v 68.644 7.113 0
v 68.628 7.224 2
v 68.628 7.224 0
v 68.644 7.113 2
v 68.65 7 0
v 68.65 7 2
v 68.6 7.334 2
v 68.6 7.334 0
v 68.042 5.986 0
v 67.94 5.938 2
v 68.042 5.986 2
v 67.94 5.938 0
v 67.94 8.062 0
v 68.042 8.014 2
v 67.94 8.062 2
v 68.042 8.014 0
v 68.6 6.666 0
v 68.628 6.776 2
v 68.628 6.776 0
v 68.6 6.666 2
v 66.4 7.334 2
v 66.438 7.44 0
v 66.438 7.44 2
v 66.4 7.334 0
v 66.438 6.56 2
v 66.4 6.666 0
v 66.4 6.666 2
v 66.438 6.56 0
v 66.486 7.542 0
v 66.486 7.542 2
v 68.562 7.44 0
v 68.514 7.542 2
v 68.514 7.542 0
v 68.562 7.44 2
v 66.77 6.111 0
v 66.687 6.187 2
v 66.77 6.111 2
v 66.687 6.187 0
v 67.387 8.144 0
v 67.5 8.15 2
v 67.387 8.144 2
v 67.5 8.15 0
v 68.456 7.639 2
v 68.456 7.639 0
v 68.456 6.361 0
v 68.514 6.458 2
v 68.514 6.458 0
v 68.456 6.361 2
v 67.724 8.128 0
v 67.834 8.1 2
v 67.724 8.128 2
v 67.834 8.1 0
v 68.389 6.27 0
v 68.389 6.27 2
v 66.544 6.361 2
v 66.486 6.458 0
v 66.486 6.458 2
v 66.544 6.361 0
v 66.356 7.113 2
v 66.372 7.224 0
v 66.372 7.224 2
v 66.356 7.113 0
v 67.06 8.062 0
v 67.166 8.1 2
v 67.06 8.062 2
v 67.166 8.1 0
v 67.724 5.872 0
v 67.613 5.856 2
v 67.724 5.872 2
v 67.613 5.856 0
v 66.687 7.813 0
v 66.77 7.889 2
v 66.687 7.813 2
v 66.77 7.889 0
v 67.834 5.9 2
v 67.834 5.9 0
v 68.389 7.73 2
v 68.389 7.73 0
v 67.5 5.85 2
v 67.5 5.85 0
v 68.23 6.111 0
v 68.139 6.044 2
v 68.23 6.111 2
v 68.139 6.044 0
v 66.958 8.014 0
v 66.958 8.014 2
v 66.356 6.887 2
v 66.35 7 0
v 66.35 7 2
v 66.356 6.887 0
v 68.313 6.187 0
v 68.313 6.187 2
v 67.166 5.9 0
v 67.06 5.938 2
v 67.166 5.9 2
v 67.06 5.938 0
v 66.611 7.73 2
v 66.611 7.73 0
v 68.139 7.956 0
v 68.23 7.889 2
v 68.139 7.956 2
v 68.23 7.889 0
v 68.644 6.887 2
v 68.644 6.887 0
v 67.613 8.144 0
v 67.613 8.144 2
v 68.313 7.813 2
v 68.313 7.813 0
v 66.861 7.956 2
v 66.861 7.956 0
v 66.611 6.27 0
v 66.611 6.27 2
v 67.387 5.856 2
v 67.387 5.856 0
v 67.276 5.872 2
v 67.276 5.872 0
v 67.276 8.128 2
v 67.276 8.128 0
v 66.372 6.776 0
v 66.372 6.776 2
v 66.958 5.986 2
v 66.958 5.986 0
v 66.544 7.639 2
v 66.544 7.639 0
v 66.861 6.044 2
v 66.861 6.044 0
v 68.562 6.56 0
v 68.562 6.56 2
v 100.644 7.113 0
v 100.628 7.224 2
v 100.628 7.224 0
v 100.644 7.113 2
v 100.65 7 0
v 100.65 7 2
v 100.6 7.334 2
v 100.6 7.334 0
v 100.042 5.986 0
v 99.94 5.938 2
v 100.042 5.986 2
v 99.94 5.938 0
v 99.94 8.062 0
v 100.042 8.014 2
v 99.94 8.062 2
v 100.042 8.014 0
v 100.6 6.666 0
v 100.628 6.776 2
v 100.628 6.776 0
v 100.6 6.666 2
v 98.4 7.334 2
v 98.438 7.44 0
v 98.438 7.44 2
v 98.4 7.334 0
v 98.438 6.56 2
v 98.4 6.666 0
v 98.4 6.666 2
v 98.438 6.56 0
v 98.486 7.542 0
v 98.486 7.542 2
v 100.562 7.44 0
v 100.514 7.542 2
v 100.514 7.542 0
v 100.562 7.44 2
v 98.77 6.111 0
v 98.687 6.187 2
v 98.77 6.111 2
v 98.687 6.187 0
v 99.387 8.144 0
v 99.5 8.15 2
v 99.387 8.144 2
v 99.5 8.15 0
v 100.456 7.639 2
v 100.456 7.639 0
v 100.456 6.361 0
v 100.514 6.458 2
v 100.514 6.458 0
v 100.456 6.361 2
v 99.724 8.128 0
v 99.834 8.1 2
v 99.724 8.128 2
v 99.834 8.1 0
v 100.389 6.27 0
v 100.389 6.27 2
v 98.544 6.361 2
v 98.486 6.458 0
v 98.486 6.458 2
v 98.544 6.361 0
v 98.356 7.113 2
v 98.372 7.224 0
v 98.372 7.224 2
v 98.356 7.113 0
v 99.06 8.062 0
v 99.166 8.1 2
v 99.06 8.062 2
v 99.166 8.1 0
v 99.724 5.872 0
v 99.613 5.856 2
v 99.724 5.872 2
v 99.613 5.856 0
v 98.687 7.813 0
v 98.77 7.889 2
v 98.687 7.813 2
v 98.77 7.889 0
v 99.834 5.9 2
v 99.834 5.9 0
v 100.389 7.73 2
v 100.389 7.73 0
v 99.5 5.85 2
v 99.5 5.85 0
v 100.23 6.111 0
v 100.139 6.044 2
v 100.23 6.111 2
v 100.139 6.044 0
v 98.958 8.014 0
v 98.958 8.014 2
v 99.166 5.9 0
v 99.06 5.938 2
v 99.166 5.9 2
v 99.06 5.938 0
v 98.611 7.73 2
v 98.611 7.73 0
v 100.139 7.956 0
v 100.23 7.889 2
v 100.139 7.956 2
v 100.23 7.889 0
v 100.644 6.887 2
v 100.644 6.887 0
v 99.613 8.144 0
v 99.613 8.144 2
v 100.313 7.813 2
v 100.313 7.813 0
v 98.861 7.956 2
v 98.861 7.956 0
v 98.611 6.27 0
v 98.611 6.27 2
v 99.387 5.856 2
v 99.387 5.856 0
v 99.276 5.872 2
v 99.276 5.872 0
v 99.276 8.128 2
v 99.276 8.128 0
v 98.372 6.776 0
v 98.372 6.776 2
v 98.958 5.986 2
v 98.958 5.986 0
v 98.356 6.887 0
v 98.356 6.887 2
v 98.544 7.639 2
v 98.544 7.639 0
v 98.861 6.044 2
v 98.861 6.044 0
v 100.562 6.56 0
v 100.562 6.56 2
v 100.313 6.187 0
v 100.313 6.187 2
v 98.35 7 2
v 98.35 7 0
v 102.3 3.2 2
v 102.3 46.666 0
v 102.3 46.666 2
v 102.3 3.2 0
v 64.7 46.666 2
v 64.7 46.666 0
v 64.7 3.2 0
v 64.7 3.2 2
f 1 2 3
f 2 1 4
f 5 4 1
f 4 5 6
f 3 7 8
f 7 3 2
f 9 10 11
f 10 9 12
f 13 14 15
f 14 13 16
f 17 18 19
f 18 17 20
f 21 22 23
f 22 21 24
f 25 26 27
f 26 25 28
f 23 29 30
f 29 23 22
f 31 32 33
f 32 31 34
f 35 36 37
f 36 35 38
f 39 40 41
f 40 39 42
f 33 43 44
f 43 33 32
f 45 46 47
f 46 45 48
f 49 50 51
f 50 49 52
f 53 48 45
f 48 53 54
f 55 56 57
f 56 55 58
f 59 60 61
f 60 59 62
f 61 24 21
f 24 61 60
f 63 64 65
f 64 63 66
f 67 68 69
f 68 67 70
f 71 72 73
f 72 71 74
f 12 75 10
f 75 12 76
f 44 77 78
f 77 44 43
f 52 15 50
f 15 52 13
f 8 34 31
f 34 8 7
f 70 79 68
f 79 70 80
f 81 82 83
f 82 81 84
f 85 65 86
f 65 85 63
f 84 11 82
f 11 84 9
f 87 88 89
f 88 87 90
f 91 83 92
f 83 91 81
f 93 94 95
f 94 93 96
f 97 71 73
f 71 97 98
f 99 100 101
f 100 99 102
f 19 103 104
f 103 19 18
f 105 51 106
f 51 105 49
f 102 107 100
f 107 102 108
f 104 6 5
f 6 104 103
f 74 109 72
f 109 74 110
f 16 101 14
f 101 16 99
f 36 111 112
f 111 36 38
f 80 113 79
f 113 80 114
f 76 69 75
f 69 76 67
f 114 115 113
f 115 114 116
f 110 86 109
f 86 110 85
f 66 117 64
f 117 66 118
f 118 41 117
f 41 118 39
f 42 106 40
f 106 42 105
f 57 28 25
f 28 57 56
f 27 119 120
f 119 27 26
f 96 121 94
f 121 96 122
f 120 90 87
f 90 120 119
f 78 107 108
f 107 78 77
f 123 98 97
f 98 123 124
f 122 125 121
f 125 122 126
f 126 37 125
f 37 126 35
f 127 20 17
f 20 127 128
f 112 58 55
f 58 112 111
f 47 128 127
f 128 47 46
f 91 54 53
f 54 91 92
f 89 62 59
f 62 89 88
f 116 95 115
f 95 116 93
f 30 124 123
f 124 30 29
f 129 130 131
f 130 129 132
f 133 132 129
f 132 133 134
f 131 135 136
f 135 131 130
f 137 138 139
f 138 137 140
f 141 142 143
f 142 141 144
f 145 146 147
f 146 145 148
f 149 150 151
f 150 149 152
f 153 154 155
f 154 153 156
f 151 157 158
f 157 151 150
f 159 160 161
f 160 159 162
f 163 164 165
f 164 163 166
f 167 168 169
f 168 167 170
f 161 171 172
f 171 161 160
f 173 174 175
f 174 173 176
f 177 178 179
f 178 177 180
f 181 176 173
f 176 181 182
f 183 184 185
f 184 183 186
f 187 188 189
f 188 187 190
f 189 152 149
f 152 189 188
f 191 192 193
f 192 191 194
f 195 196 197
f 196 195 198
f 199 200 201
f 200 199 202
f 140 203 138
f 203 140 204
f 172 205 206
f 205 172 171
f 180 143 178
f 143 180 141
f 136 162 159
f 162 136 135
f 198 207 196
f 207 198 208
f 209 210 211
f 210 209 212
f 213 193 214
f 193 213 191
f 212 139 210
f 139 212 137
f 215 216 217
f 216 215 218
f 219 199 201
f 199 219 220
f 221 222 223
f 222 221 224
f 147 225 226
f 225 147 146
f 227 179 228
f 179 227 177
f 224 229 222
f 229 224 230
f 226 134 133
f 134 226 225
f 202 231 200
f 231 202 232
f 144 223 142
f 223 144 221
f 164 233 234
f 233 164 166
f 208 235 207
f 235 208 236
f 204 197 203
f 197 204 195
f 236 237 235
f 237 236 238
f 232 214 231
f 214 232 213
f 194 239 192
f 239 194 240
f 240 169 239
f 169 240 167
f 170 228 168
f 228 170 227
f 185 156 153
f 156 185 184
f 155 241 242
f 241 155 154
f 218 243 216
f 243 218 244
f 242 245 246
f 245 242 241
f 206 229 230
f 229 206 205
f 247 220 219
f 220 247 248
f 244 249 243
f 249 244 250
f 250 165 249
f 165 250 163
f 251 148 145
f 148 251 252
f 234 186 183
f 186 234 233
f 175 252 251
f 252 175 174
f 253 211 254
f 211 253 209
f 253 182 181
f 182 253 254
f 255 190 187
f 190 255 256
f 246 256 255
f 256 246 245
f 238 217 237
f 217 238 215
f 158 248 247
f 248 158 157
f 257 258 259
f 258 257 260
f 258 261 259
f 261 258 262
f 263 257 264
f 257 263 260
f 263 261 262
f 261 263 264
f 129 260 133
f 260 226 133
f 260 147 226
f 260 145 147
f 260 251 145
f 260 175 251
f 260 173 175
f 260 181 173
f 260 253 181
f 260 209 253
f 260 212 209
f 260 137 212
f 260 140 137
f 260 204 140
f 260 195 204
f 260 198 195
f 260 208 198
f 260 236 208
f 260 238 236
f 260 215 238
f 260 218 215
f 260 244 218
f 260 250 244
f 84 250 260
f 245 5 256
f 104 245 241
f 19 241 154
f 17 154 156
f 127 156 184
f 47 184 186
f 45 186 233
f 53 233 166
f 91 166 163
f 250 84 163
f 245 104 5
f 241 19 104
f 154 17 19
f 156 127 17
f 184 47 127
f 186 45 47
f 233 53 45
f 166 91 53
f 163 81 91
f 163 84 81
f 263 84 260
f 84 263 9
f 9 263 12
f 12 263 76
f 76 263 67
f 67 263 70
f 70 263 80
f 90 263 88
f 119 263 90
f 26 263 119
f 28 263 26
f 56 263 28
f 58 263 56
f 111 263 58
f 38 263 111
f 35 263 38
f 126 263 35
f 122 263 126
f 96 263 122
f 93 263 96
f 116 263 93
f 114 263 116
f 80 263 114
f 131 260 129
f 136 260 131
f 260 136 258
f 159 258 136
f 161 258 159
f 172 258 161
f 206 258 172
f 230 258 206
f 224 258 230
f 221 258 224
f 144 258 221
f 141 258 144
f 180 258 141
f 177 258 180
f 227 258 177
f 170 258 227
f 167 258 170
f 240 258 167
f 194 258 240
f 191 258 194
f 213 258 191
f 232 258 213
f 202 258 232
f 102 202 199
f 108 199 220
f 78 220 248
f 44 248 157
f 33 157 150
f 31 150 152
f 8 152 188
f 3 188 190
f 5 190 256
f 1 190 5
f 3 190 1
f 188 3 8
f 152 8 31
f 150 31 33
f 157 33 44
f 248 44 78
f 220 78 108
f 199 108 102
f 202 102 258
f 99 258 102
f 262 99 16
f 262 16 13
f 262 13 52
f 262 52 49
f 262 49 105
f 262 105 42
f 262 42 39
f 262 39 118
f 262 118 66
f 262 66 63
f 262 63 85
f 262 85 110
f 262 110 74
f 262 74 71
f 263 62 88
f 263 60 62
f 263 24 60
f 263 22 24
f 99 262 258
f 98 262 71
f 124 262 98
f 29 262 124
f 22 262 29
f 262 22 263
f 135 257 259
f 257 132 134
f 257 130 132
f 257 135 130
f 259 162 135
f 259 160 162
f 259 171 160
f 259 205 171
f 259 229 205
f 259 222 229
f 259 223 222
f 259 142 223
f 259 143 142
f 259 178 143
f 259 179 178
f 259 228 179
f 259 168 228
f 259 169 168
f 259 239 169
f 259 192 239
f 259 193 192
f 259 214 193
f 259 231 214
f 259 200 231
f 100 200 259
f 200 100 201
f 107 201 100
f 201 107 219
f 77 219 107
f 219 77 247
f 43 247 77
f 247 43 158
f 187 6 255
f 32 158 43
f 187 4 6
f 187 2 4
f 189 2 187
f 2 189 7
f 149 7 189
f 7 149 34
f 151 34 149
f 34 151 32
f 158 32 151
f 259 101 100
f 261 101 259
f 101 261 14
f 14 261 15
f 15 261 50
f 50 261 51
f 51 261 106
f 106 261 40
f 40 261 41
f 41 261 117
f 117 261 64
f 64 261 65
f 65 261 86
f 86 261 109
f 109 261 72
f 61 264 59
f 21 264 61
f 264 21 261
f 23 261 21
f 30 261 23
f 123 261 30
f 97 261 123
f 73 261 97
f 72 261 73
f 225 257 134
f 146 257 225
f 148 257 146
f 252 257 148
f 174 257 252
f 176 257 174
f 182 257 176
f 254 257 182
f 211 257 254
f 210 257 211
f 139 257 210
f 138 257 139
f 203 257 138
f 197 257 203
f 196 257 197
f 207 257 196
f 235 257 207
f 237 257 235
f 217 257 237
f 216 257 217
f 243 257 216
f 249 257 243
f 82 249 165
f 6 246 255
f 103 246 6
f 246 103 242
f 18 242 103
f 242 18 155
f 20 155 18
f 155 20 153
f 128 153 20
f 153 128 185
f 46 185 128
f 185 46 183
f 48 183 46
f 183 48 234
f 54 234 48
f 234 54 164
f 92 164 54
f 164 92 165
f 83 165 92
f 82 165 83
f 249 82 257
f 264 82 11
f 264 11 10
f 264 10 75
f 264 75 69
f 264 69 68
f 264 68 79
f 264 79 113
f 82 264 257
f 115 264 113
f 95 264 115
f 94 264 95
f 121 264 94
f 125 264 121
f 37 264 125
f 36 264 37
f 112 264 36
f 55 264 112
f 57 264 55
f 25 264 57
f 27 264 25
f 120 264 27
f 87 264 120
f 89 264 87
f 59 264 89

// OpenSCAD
// file: kagu_top.scad
// Kagu top plate -- the switch plate and the short skirt that carries it, one
// part that sits on the bottom tray's border and closes the case.
//
// This file expects the geometry file and kagu_tray.scad to be included first:
// the plate reuses the tray's stack heights and its 2D profiles, so the skirt
// lands exactly on the border, cable swell included. See case/left_top.scad
// and case/right_top.scad.
//
// The same five M3 screws that hold the PCB now clamp plate, PCB and tray
// together: each runs through a spacer under the plate, then the PCB, into the
// tray's heat-set insert. The PCB mounting holes are DIN 965 footprints, so the
// plate is countersunk for flat-head screws that finish flush. M3 x 8 is right
// for the stack below; anything longer bottoms out in the insert hole.

// ---------------------------------------------------------------------------
// Vertical stack, on top of the tray's (which ends at the PCB top face).
// ---------------------------------------------------------------------------
pcb_to_plate = 2.2;   // PCB top -> plate underside, set by the Choc switch body
plate_t      = 1.3;   // Choc clips want 1.2-1.3mm
skirt_gap    = 1.0;   // the skirt stops this far above the tray border, so the
                      // screws clamp plate, switches and PCB together instead of
                      // the skirt landing on the border first (on the first print
                      // some hotswap sockets lost contact). The screw spacers
                      // stop at the same height.

// ---------------------------------------------------------------------------
// Openings
// ---------------------------------------------------------------------------
switch_cut   = 13.8;  // Kailh Choc v1/v2 plate cutout
window_clear = 0.4;   // margin around the XIAO

// ---------------------------------------------------------------------------
// Fasteners -- countersunk M3 (DIN 965 / ISO 7046), 90 degree head.
// ---------------------------------------------------------------------------
spacer_d      = 6.0;  // sits on the 6mm mounting-hole pad, clear of the parts
screw_clear_d = 3.4;
csk_d         = 6.2;  // head diameter plus a little, so it lands flush

// ---------------------------------------------------------------------------
// Supports -- pillars from the plate down onto the PCB so it does not flex
// under typing. Left-half coordinates, mirrored for the right half (the boards
// are mirror images). Three per column gap, where they clear the switch
// latches by 0.5mm, plus the open stretches round the thumb cluster, beside
// the outer columns and next to the battery connector. All land on bare PCB: the diodes and hotswap
// sockets are on the back, and none of these spots touch a front pad.
// ---------------------------------------------------------------------------
use_supports = true;   // they stop skirt_gap short of the PCB, like the skirt
                       // and the screw spacers, so they cannot hold the PCB
                       // off the switch pins
support_d = 2.4;
supports  = [
    [24, 39.5], [24, 53.5], [24, 67.5],
    [42, 45.6], [42, 62.5], [42, 79.4],
    [60, 45.6], [60, 62.0], [60, 78.4],
    [78, 38.6], [78, 57.5], [78, 76.4],
    [57, 35], [80, 30], [95, 28], [98, 40], [97, 57], [97, 72],
    [110, 32.3], [4, 47],
];

// Same web cleanup as the old one-piece case: the battery-LED connector lands
// 0.35mm from the SW16 cutout, so opening its window leaves a sliver too thin
// to print. Opening the
// profile by min_web deletes any web thinner than 2*min_web and leaves the
// rest alone. Set to 0 to disable.
min_web = 0.3;

// ---------------------------------------------------------------------------
// Derived
// ---------------------------------------------------------------------------
plate_z = tray_h + pcb_to_plate;   // plate underside
top_h   = pcb_to_plate + plate_t;  // overall height of this part
support_pts = !use_supports ? []
            : chip_right ? supports : [for (p = supports) [board_w - p[0], p[1]]];

echo(str("top: skirt ", pcb_to_plate, " + plate ", plate_t, " = ", top_h,
         "mm,  case ", tray_h + top_h, "mm tall assembled,  screws M3 x 8 csk"));

// ---------------------------------------------------------------------------
// 2D
// ---------------------------------------------------------------------------
module rect(r, c = 0) {
    translate([r[0] - c, r[1] - c])
        square([r[2] - r[0] + 2 * c, r[3] - r[1] + 2 * c]);
}

// The case outline the plate covers. kagu_screen.scad can set `plate_cut`
// [x, y]: everything past both is left to the screen base on the left half.
module top_shell_2d() {
    difference() {
        shell_2d();
        if (!is_undef(plate_cut)) translate(plate_cut) square(big);
    }
}

module plate_profile() {
    difference() {
        top_shell_2d();

        for (s = switches)
            translate([s[0], s[1]])
                rotate(s[2])
                    square(switch_cut, center = true);

        // No windows over the JST footprints (tall_parts): none are fitted, and a
        // header would hit the plate. Cut the windows again with
        // `for (t = tall_parts) rect(t, window_clear);` when the ledge is wired.

        // Open bay over the XIAO: clears the module however deep it seats, and
        // lets its RGB status LED show.
        rect(xiao, window_clear);
    }
}

// ---------------------------------------------------------------------------
// Assembly -- modelled in place on top of the tray; printed upside down.
// ---------------------------------------------------------------------------
module top_plate_in_place() {
    difference() {
        union() {
            // skirt, the same skin as the tray border
            translate([0, 0, tray_h + skirt_gap])
                linear_extrude(pcb_to_plate - skirt_gap)
                    difference() { top_shell_2d(); cavity_2d(); }
            translate([0, 0, plate_z])
                linear_extrude(plate_t)
                    if (min_web > 0) offset(r = min_web) offset(r = -min_web) plate_profile();
                    else plate_profile();
            // spacers that let the screws clamp the plate down onto the PCB
            for (p = concat(screws, ledge_pts()))
                translate([p[0], p[1], tray_h + skirt_gap])
                    cylinder(d = spacer_d, h = top_h - skirt_gap);
            for (p = support_pts)
                translate([p[0], p[1], tray_h + skirt_gap])
                    cylinder(d = support_d, h = top_h - skirt_gap);
        }
        for (p = concat(screws, ledge_pts()))
            translate([p[0], p[1], 0]) {
                translate([0, 0, tray_h - eps])
                    cylinder(d = screw_clear_d, h = top_h + 2 * eps);
                // 90 degree countersink, flush with the plate top
                translate([0, 0, plate_z + plate_t - csk_d / 2 + eps])
                    cylinder(d1 = 0, d2 = csk_d, h = csk_d / 2);
            }
        // USB-C: the tray's notch, carried through the skirt and the plate.
        translate([0, 0, tray_h - eps])
            linear_extrude(top_h + 2 * eps) usb_slot_2d();
    }
}

// Plate face down on the bed: the visible surface comes off the build plate
// smooth, and the skirt and spacers print upward without supports.
module top_plate() {
    translate([0, 0, tray_h + top_h])
        rotate([180, 0, 0])
            top_plate_in_place();
}
// file: kagu_left_geom.scad
// GENERATED by case/extract_geometry.py -- do not edit.
// Source: pcb/kagu-left/kagu.kicad_pcb

board_w = 127;
board_h = 91.5;

// Board outline, counter-clockwise, origin at bounding-box corner.
outline = [ [0, 76.5], [0, 22], [26, 22], [30, 34], [41.5, 34], [53.5, 12.5], [72.5, 12.5], [106, 0], [127, 37], [127, 82.5], [77.5, 82.5], [77.5, 84.5], [61.5, 84.5], [61.5, 91.5], [40.5, 91.5], [40.5, 85.5], [22.5, 85.5], [22.5, 76.5] ];

// M3 mounting holes.
screws = [ [122, 35.5], [45, 35.5], [3.5, 25.5], [3.5, 73], [123.5, 79] ];

// Switch centres as [x, y, rotation].
switches = [ [15, 64.5, -0], [63, 21.5, -180], [87, 39.5, -0], [69, 41.5, -0], [51, 48.5, -0], [33, 76.5, -0], [51, 82.5, -0], [104, 15.5, 120], [87, 56.5, -0], [69, 75.5, -0], [83, 18.5, -160], [69, 58.5, -0], [87, 73.5, -0], [33, 59.5, -0], [15, 30.5, -0], [15, 47.5, -0], [51, 65.5, -0], [33, 42.5, -0] ];

// Components taller than the plate gap: [x0, y0, x1, y1].
tall_parts = [
    [111.5, 39.6, 119.5, 47.2],  // Switch_Con1
    [101.5, 39.6, 109.5, 47.2],  // Bat_Con1
    [103, 24.98, 108.7, 30.57],  // Bat_LED_Con1
];

// XIAO board cutout [x0, y0, x1, y1].
xiao = [101.8, 59.99, 119.6, 80.95];

// USB-C connector envelope [x0, y0, x1, y1].
usb = [106.2, 81.04, 115.2, 82.55];

// Reset button centre.
reset = [116, 32.5];
// main file
// Entry point for the left screen pod's back cover. Render with:
//   openscad -o build/kagu_left_screen_cover.stl case/left_screen_cover.scad
include <kagu_left_geom.scad>
include <kagu_tray.scad>
include <kagu_top.scad>
include <kagu_screen.scad>

// Flat on the bed, outside face down.
rotate([-90, 0, 0]) translate([0, -pod_back, 0]) screen_cover();
